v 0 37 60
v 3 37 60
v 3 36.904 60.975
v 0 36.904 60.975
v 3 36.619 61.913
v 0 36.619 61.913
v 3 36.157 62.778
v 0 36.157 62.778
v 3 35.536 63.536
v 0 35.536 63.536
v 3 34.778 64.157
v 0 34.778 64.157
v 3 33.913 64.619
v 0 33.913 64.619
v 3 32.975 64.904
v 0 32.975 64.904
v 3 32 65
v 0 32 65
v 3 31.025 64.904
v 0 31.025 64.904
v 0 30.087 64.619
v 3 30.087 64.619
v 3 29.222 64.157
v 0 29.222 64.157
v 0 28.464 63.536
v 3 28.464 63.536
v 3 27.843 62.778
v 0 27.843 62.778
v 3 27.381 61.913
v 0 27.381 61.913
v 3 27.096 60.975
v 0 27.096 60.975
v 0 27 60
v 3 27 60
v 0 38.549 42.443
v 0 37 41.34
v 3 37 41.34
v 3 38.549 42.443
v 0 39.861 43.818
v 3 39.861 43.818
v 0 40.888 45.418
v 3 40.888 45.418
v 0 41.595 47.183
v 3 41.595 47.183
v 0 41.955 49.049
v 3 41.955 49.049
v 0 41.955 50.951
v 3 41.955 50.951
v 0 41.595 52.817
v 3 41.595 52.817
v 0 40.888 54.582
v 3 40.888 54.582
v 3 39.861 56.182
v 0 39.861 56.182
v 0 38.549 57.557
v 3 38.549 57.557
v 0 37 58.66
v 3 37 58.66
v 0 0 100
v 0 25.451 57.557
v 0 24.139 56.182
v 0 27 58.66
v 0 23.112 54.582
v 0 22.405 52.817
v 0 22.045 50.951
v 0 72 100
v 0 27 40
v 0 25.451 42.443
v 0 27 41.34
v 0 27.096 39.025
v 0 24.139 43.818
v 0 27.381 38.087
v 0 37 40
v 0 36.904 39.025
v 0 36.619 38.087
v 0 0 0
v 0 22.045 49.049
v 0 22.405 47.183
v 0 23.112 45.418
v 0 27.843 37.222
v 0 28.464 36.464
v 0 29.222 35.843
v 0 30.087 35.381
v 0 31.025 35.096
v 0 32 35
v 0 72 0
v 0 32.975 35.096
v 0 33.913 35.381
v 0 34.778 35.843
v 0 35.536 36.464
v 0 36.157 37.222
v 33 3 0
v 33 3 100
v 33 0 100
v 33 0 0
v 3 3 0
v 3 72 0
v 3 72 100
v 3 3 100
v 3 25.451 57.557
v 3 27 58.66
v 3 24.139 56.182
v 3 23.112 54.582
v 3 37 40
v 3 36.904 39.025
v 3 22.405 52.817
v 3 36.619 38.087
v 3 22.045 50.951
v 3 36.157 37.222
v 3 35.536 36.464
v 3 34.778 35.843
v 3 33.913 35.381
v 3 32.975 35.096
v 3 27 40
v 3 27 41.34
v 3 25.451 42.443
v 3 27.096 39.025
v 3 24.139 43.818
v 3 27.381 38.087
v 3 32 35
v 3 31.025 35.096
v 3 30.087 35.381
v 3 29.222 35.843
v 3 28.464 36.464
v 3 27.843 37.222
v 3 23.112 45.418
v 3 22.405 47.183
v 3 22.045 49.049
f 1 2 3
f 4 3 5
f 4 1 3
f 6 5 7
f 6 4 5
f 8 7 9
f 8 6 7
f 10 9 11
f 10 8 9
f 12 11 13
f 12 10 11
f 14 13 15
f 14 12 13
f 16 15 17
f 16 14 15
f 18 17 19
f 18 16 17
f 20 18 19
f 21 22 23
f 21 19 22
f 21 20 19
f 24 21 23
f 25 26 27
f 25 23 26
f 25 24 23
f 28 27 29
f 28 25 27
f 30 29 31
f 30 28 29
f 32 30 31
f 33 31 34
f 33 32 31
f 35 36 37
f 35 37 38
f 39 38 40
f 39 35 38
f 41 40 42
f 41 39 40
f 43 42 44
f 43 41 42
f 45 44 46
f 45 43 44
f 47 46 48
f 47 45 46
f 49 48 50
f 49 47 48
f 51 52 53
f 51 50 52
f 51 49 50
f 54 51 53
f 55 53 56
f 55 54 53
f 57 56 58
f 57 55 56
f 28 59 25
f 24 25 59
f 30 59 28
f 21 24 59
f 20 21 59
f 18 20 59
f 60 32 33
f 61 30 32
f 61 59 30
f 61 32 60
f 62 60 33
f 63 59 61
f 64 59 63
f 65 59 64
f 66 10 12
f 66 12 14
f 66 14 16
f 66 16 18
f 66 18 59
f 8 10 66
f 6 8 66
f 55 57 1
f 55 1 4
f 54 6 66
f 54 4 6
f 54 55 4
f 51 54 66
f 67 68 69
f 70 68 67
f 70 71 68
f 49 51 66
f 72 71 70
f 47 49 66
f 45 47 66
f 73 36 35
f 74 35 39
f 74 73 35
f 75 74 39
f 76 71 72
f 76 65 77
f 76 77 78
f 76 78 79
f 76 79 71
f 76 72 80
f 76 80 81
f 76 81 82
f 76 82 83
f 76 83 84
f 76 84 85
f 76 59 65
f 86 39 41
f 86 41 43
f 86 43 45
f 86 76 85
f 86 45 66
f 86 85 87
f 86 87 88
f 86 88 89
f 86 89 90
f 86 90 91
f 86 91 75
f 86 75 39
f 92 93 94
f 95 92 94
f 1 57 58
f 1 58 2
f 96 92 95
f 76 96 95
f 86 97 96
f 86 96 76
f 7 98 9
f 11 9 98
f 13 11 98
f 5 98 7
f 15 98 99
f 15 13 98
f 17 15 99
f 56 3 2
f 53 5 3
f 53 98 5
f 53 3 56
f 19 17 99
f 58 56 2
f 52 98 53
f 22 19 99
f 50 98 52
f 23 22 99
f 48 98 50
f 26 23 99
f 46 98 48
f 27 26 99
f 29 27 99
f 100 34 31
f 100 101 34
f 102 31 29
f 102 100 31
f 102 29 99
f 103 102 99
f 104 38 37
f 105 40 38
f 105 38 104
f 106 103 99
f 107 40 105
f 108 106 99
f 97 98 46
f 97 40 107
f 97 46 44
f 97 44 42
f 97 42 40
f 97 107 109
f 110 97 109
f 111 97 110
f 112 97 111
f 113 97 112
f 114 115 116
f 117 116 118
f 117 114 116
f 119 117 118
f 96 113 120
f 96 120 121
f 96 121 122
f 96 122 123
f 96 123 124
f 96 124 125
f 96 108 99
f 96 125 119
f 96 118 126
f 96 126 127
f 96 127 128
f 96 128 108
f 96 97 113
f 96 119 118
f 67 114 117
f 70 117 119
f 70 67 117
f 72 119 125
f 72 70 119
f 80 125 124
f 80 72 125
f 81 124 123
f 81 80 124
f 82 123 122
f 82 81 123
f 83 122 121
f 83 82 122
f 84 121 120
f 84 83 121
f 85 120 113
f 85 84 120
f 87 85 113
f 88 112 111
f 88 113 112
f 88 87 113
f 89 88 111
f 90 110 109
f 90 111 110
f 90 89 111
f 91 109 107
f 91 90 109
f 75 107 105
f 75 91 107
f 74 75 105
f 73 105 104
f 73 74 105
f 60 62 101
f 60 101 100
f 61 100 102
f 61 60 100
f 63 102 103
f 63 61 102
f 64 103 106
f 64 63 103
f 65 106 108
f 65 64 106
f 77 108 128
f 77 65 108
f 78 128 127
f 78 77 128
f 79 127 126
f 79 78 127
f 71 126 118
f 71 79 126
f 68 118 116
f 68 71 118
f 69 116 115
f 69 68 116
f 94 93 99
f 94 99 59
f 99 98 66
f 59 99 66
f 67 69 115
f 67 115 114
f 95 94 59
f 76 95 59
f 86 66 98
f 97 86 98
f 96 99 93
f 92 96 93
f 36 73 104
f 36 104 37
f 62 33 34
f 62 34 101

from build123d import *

# Parameters (mm, degrees)
BOSS_EXTRUDE1_DEPTH = 100
CUT_EXTRUDE1_DEPTH  = 100


with BuildPart() as part:
    # Sketch1 → Boss-Extrude1 (new body)
    with BuildSketch(Plane.XY):
        Polygon((0, 72), (3, 72), (3, 3), (33, 3), (33, 0), (0, 0), align=None)
    extrude(amount=BOSS_EXTRUDE1_DEPTH)

    # Sketch2 → Cut-Extrude1 (cut)
    with BuildSketch(Plane.ZY):
        with BuildLine():
            Line((58.660254038, 37), (60, 37))
            ThreePointArc((60, 37), (65, 32), (60, 27))
            Line((60, 27), (58.660254038, 27))
            ThreePointArc((58.660254038, 27), (50, 22), (41.339745962, 27))
            Line((41.339745962, 27), (40, 27))
            ThreePointArc((40, 27), (35, 32), (40, 37))
            Line((40, 37), (41.339745962, 37))
            ThreePointArc((41.339745962, 37), (50, 42), (58.660254038, 37))
        make_face()
    extrude(amount=-CUT_EXTRUDE1_DEPTH, mode=Mode.SUBTRACT)


solid = part.part
